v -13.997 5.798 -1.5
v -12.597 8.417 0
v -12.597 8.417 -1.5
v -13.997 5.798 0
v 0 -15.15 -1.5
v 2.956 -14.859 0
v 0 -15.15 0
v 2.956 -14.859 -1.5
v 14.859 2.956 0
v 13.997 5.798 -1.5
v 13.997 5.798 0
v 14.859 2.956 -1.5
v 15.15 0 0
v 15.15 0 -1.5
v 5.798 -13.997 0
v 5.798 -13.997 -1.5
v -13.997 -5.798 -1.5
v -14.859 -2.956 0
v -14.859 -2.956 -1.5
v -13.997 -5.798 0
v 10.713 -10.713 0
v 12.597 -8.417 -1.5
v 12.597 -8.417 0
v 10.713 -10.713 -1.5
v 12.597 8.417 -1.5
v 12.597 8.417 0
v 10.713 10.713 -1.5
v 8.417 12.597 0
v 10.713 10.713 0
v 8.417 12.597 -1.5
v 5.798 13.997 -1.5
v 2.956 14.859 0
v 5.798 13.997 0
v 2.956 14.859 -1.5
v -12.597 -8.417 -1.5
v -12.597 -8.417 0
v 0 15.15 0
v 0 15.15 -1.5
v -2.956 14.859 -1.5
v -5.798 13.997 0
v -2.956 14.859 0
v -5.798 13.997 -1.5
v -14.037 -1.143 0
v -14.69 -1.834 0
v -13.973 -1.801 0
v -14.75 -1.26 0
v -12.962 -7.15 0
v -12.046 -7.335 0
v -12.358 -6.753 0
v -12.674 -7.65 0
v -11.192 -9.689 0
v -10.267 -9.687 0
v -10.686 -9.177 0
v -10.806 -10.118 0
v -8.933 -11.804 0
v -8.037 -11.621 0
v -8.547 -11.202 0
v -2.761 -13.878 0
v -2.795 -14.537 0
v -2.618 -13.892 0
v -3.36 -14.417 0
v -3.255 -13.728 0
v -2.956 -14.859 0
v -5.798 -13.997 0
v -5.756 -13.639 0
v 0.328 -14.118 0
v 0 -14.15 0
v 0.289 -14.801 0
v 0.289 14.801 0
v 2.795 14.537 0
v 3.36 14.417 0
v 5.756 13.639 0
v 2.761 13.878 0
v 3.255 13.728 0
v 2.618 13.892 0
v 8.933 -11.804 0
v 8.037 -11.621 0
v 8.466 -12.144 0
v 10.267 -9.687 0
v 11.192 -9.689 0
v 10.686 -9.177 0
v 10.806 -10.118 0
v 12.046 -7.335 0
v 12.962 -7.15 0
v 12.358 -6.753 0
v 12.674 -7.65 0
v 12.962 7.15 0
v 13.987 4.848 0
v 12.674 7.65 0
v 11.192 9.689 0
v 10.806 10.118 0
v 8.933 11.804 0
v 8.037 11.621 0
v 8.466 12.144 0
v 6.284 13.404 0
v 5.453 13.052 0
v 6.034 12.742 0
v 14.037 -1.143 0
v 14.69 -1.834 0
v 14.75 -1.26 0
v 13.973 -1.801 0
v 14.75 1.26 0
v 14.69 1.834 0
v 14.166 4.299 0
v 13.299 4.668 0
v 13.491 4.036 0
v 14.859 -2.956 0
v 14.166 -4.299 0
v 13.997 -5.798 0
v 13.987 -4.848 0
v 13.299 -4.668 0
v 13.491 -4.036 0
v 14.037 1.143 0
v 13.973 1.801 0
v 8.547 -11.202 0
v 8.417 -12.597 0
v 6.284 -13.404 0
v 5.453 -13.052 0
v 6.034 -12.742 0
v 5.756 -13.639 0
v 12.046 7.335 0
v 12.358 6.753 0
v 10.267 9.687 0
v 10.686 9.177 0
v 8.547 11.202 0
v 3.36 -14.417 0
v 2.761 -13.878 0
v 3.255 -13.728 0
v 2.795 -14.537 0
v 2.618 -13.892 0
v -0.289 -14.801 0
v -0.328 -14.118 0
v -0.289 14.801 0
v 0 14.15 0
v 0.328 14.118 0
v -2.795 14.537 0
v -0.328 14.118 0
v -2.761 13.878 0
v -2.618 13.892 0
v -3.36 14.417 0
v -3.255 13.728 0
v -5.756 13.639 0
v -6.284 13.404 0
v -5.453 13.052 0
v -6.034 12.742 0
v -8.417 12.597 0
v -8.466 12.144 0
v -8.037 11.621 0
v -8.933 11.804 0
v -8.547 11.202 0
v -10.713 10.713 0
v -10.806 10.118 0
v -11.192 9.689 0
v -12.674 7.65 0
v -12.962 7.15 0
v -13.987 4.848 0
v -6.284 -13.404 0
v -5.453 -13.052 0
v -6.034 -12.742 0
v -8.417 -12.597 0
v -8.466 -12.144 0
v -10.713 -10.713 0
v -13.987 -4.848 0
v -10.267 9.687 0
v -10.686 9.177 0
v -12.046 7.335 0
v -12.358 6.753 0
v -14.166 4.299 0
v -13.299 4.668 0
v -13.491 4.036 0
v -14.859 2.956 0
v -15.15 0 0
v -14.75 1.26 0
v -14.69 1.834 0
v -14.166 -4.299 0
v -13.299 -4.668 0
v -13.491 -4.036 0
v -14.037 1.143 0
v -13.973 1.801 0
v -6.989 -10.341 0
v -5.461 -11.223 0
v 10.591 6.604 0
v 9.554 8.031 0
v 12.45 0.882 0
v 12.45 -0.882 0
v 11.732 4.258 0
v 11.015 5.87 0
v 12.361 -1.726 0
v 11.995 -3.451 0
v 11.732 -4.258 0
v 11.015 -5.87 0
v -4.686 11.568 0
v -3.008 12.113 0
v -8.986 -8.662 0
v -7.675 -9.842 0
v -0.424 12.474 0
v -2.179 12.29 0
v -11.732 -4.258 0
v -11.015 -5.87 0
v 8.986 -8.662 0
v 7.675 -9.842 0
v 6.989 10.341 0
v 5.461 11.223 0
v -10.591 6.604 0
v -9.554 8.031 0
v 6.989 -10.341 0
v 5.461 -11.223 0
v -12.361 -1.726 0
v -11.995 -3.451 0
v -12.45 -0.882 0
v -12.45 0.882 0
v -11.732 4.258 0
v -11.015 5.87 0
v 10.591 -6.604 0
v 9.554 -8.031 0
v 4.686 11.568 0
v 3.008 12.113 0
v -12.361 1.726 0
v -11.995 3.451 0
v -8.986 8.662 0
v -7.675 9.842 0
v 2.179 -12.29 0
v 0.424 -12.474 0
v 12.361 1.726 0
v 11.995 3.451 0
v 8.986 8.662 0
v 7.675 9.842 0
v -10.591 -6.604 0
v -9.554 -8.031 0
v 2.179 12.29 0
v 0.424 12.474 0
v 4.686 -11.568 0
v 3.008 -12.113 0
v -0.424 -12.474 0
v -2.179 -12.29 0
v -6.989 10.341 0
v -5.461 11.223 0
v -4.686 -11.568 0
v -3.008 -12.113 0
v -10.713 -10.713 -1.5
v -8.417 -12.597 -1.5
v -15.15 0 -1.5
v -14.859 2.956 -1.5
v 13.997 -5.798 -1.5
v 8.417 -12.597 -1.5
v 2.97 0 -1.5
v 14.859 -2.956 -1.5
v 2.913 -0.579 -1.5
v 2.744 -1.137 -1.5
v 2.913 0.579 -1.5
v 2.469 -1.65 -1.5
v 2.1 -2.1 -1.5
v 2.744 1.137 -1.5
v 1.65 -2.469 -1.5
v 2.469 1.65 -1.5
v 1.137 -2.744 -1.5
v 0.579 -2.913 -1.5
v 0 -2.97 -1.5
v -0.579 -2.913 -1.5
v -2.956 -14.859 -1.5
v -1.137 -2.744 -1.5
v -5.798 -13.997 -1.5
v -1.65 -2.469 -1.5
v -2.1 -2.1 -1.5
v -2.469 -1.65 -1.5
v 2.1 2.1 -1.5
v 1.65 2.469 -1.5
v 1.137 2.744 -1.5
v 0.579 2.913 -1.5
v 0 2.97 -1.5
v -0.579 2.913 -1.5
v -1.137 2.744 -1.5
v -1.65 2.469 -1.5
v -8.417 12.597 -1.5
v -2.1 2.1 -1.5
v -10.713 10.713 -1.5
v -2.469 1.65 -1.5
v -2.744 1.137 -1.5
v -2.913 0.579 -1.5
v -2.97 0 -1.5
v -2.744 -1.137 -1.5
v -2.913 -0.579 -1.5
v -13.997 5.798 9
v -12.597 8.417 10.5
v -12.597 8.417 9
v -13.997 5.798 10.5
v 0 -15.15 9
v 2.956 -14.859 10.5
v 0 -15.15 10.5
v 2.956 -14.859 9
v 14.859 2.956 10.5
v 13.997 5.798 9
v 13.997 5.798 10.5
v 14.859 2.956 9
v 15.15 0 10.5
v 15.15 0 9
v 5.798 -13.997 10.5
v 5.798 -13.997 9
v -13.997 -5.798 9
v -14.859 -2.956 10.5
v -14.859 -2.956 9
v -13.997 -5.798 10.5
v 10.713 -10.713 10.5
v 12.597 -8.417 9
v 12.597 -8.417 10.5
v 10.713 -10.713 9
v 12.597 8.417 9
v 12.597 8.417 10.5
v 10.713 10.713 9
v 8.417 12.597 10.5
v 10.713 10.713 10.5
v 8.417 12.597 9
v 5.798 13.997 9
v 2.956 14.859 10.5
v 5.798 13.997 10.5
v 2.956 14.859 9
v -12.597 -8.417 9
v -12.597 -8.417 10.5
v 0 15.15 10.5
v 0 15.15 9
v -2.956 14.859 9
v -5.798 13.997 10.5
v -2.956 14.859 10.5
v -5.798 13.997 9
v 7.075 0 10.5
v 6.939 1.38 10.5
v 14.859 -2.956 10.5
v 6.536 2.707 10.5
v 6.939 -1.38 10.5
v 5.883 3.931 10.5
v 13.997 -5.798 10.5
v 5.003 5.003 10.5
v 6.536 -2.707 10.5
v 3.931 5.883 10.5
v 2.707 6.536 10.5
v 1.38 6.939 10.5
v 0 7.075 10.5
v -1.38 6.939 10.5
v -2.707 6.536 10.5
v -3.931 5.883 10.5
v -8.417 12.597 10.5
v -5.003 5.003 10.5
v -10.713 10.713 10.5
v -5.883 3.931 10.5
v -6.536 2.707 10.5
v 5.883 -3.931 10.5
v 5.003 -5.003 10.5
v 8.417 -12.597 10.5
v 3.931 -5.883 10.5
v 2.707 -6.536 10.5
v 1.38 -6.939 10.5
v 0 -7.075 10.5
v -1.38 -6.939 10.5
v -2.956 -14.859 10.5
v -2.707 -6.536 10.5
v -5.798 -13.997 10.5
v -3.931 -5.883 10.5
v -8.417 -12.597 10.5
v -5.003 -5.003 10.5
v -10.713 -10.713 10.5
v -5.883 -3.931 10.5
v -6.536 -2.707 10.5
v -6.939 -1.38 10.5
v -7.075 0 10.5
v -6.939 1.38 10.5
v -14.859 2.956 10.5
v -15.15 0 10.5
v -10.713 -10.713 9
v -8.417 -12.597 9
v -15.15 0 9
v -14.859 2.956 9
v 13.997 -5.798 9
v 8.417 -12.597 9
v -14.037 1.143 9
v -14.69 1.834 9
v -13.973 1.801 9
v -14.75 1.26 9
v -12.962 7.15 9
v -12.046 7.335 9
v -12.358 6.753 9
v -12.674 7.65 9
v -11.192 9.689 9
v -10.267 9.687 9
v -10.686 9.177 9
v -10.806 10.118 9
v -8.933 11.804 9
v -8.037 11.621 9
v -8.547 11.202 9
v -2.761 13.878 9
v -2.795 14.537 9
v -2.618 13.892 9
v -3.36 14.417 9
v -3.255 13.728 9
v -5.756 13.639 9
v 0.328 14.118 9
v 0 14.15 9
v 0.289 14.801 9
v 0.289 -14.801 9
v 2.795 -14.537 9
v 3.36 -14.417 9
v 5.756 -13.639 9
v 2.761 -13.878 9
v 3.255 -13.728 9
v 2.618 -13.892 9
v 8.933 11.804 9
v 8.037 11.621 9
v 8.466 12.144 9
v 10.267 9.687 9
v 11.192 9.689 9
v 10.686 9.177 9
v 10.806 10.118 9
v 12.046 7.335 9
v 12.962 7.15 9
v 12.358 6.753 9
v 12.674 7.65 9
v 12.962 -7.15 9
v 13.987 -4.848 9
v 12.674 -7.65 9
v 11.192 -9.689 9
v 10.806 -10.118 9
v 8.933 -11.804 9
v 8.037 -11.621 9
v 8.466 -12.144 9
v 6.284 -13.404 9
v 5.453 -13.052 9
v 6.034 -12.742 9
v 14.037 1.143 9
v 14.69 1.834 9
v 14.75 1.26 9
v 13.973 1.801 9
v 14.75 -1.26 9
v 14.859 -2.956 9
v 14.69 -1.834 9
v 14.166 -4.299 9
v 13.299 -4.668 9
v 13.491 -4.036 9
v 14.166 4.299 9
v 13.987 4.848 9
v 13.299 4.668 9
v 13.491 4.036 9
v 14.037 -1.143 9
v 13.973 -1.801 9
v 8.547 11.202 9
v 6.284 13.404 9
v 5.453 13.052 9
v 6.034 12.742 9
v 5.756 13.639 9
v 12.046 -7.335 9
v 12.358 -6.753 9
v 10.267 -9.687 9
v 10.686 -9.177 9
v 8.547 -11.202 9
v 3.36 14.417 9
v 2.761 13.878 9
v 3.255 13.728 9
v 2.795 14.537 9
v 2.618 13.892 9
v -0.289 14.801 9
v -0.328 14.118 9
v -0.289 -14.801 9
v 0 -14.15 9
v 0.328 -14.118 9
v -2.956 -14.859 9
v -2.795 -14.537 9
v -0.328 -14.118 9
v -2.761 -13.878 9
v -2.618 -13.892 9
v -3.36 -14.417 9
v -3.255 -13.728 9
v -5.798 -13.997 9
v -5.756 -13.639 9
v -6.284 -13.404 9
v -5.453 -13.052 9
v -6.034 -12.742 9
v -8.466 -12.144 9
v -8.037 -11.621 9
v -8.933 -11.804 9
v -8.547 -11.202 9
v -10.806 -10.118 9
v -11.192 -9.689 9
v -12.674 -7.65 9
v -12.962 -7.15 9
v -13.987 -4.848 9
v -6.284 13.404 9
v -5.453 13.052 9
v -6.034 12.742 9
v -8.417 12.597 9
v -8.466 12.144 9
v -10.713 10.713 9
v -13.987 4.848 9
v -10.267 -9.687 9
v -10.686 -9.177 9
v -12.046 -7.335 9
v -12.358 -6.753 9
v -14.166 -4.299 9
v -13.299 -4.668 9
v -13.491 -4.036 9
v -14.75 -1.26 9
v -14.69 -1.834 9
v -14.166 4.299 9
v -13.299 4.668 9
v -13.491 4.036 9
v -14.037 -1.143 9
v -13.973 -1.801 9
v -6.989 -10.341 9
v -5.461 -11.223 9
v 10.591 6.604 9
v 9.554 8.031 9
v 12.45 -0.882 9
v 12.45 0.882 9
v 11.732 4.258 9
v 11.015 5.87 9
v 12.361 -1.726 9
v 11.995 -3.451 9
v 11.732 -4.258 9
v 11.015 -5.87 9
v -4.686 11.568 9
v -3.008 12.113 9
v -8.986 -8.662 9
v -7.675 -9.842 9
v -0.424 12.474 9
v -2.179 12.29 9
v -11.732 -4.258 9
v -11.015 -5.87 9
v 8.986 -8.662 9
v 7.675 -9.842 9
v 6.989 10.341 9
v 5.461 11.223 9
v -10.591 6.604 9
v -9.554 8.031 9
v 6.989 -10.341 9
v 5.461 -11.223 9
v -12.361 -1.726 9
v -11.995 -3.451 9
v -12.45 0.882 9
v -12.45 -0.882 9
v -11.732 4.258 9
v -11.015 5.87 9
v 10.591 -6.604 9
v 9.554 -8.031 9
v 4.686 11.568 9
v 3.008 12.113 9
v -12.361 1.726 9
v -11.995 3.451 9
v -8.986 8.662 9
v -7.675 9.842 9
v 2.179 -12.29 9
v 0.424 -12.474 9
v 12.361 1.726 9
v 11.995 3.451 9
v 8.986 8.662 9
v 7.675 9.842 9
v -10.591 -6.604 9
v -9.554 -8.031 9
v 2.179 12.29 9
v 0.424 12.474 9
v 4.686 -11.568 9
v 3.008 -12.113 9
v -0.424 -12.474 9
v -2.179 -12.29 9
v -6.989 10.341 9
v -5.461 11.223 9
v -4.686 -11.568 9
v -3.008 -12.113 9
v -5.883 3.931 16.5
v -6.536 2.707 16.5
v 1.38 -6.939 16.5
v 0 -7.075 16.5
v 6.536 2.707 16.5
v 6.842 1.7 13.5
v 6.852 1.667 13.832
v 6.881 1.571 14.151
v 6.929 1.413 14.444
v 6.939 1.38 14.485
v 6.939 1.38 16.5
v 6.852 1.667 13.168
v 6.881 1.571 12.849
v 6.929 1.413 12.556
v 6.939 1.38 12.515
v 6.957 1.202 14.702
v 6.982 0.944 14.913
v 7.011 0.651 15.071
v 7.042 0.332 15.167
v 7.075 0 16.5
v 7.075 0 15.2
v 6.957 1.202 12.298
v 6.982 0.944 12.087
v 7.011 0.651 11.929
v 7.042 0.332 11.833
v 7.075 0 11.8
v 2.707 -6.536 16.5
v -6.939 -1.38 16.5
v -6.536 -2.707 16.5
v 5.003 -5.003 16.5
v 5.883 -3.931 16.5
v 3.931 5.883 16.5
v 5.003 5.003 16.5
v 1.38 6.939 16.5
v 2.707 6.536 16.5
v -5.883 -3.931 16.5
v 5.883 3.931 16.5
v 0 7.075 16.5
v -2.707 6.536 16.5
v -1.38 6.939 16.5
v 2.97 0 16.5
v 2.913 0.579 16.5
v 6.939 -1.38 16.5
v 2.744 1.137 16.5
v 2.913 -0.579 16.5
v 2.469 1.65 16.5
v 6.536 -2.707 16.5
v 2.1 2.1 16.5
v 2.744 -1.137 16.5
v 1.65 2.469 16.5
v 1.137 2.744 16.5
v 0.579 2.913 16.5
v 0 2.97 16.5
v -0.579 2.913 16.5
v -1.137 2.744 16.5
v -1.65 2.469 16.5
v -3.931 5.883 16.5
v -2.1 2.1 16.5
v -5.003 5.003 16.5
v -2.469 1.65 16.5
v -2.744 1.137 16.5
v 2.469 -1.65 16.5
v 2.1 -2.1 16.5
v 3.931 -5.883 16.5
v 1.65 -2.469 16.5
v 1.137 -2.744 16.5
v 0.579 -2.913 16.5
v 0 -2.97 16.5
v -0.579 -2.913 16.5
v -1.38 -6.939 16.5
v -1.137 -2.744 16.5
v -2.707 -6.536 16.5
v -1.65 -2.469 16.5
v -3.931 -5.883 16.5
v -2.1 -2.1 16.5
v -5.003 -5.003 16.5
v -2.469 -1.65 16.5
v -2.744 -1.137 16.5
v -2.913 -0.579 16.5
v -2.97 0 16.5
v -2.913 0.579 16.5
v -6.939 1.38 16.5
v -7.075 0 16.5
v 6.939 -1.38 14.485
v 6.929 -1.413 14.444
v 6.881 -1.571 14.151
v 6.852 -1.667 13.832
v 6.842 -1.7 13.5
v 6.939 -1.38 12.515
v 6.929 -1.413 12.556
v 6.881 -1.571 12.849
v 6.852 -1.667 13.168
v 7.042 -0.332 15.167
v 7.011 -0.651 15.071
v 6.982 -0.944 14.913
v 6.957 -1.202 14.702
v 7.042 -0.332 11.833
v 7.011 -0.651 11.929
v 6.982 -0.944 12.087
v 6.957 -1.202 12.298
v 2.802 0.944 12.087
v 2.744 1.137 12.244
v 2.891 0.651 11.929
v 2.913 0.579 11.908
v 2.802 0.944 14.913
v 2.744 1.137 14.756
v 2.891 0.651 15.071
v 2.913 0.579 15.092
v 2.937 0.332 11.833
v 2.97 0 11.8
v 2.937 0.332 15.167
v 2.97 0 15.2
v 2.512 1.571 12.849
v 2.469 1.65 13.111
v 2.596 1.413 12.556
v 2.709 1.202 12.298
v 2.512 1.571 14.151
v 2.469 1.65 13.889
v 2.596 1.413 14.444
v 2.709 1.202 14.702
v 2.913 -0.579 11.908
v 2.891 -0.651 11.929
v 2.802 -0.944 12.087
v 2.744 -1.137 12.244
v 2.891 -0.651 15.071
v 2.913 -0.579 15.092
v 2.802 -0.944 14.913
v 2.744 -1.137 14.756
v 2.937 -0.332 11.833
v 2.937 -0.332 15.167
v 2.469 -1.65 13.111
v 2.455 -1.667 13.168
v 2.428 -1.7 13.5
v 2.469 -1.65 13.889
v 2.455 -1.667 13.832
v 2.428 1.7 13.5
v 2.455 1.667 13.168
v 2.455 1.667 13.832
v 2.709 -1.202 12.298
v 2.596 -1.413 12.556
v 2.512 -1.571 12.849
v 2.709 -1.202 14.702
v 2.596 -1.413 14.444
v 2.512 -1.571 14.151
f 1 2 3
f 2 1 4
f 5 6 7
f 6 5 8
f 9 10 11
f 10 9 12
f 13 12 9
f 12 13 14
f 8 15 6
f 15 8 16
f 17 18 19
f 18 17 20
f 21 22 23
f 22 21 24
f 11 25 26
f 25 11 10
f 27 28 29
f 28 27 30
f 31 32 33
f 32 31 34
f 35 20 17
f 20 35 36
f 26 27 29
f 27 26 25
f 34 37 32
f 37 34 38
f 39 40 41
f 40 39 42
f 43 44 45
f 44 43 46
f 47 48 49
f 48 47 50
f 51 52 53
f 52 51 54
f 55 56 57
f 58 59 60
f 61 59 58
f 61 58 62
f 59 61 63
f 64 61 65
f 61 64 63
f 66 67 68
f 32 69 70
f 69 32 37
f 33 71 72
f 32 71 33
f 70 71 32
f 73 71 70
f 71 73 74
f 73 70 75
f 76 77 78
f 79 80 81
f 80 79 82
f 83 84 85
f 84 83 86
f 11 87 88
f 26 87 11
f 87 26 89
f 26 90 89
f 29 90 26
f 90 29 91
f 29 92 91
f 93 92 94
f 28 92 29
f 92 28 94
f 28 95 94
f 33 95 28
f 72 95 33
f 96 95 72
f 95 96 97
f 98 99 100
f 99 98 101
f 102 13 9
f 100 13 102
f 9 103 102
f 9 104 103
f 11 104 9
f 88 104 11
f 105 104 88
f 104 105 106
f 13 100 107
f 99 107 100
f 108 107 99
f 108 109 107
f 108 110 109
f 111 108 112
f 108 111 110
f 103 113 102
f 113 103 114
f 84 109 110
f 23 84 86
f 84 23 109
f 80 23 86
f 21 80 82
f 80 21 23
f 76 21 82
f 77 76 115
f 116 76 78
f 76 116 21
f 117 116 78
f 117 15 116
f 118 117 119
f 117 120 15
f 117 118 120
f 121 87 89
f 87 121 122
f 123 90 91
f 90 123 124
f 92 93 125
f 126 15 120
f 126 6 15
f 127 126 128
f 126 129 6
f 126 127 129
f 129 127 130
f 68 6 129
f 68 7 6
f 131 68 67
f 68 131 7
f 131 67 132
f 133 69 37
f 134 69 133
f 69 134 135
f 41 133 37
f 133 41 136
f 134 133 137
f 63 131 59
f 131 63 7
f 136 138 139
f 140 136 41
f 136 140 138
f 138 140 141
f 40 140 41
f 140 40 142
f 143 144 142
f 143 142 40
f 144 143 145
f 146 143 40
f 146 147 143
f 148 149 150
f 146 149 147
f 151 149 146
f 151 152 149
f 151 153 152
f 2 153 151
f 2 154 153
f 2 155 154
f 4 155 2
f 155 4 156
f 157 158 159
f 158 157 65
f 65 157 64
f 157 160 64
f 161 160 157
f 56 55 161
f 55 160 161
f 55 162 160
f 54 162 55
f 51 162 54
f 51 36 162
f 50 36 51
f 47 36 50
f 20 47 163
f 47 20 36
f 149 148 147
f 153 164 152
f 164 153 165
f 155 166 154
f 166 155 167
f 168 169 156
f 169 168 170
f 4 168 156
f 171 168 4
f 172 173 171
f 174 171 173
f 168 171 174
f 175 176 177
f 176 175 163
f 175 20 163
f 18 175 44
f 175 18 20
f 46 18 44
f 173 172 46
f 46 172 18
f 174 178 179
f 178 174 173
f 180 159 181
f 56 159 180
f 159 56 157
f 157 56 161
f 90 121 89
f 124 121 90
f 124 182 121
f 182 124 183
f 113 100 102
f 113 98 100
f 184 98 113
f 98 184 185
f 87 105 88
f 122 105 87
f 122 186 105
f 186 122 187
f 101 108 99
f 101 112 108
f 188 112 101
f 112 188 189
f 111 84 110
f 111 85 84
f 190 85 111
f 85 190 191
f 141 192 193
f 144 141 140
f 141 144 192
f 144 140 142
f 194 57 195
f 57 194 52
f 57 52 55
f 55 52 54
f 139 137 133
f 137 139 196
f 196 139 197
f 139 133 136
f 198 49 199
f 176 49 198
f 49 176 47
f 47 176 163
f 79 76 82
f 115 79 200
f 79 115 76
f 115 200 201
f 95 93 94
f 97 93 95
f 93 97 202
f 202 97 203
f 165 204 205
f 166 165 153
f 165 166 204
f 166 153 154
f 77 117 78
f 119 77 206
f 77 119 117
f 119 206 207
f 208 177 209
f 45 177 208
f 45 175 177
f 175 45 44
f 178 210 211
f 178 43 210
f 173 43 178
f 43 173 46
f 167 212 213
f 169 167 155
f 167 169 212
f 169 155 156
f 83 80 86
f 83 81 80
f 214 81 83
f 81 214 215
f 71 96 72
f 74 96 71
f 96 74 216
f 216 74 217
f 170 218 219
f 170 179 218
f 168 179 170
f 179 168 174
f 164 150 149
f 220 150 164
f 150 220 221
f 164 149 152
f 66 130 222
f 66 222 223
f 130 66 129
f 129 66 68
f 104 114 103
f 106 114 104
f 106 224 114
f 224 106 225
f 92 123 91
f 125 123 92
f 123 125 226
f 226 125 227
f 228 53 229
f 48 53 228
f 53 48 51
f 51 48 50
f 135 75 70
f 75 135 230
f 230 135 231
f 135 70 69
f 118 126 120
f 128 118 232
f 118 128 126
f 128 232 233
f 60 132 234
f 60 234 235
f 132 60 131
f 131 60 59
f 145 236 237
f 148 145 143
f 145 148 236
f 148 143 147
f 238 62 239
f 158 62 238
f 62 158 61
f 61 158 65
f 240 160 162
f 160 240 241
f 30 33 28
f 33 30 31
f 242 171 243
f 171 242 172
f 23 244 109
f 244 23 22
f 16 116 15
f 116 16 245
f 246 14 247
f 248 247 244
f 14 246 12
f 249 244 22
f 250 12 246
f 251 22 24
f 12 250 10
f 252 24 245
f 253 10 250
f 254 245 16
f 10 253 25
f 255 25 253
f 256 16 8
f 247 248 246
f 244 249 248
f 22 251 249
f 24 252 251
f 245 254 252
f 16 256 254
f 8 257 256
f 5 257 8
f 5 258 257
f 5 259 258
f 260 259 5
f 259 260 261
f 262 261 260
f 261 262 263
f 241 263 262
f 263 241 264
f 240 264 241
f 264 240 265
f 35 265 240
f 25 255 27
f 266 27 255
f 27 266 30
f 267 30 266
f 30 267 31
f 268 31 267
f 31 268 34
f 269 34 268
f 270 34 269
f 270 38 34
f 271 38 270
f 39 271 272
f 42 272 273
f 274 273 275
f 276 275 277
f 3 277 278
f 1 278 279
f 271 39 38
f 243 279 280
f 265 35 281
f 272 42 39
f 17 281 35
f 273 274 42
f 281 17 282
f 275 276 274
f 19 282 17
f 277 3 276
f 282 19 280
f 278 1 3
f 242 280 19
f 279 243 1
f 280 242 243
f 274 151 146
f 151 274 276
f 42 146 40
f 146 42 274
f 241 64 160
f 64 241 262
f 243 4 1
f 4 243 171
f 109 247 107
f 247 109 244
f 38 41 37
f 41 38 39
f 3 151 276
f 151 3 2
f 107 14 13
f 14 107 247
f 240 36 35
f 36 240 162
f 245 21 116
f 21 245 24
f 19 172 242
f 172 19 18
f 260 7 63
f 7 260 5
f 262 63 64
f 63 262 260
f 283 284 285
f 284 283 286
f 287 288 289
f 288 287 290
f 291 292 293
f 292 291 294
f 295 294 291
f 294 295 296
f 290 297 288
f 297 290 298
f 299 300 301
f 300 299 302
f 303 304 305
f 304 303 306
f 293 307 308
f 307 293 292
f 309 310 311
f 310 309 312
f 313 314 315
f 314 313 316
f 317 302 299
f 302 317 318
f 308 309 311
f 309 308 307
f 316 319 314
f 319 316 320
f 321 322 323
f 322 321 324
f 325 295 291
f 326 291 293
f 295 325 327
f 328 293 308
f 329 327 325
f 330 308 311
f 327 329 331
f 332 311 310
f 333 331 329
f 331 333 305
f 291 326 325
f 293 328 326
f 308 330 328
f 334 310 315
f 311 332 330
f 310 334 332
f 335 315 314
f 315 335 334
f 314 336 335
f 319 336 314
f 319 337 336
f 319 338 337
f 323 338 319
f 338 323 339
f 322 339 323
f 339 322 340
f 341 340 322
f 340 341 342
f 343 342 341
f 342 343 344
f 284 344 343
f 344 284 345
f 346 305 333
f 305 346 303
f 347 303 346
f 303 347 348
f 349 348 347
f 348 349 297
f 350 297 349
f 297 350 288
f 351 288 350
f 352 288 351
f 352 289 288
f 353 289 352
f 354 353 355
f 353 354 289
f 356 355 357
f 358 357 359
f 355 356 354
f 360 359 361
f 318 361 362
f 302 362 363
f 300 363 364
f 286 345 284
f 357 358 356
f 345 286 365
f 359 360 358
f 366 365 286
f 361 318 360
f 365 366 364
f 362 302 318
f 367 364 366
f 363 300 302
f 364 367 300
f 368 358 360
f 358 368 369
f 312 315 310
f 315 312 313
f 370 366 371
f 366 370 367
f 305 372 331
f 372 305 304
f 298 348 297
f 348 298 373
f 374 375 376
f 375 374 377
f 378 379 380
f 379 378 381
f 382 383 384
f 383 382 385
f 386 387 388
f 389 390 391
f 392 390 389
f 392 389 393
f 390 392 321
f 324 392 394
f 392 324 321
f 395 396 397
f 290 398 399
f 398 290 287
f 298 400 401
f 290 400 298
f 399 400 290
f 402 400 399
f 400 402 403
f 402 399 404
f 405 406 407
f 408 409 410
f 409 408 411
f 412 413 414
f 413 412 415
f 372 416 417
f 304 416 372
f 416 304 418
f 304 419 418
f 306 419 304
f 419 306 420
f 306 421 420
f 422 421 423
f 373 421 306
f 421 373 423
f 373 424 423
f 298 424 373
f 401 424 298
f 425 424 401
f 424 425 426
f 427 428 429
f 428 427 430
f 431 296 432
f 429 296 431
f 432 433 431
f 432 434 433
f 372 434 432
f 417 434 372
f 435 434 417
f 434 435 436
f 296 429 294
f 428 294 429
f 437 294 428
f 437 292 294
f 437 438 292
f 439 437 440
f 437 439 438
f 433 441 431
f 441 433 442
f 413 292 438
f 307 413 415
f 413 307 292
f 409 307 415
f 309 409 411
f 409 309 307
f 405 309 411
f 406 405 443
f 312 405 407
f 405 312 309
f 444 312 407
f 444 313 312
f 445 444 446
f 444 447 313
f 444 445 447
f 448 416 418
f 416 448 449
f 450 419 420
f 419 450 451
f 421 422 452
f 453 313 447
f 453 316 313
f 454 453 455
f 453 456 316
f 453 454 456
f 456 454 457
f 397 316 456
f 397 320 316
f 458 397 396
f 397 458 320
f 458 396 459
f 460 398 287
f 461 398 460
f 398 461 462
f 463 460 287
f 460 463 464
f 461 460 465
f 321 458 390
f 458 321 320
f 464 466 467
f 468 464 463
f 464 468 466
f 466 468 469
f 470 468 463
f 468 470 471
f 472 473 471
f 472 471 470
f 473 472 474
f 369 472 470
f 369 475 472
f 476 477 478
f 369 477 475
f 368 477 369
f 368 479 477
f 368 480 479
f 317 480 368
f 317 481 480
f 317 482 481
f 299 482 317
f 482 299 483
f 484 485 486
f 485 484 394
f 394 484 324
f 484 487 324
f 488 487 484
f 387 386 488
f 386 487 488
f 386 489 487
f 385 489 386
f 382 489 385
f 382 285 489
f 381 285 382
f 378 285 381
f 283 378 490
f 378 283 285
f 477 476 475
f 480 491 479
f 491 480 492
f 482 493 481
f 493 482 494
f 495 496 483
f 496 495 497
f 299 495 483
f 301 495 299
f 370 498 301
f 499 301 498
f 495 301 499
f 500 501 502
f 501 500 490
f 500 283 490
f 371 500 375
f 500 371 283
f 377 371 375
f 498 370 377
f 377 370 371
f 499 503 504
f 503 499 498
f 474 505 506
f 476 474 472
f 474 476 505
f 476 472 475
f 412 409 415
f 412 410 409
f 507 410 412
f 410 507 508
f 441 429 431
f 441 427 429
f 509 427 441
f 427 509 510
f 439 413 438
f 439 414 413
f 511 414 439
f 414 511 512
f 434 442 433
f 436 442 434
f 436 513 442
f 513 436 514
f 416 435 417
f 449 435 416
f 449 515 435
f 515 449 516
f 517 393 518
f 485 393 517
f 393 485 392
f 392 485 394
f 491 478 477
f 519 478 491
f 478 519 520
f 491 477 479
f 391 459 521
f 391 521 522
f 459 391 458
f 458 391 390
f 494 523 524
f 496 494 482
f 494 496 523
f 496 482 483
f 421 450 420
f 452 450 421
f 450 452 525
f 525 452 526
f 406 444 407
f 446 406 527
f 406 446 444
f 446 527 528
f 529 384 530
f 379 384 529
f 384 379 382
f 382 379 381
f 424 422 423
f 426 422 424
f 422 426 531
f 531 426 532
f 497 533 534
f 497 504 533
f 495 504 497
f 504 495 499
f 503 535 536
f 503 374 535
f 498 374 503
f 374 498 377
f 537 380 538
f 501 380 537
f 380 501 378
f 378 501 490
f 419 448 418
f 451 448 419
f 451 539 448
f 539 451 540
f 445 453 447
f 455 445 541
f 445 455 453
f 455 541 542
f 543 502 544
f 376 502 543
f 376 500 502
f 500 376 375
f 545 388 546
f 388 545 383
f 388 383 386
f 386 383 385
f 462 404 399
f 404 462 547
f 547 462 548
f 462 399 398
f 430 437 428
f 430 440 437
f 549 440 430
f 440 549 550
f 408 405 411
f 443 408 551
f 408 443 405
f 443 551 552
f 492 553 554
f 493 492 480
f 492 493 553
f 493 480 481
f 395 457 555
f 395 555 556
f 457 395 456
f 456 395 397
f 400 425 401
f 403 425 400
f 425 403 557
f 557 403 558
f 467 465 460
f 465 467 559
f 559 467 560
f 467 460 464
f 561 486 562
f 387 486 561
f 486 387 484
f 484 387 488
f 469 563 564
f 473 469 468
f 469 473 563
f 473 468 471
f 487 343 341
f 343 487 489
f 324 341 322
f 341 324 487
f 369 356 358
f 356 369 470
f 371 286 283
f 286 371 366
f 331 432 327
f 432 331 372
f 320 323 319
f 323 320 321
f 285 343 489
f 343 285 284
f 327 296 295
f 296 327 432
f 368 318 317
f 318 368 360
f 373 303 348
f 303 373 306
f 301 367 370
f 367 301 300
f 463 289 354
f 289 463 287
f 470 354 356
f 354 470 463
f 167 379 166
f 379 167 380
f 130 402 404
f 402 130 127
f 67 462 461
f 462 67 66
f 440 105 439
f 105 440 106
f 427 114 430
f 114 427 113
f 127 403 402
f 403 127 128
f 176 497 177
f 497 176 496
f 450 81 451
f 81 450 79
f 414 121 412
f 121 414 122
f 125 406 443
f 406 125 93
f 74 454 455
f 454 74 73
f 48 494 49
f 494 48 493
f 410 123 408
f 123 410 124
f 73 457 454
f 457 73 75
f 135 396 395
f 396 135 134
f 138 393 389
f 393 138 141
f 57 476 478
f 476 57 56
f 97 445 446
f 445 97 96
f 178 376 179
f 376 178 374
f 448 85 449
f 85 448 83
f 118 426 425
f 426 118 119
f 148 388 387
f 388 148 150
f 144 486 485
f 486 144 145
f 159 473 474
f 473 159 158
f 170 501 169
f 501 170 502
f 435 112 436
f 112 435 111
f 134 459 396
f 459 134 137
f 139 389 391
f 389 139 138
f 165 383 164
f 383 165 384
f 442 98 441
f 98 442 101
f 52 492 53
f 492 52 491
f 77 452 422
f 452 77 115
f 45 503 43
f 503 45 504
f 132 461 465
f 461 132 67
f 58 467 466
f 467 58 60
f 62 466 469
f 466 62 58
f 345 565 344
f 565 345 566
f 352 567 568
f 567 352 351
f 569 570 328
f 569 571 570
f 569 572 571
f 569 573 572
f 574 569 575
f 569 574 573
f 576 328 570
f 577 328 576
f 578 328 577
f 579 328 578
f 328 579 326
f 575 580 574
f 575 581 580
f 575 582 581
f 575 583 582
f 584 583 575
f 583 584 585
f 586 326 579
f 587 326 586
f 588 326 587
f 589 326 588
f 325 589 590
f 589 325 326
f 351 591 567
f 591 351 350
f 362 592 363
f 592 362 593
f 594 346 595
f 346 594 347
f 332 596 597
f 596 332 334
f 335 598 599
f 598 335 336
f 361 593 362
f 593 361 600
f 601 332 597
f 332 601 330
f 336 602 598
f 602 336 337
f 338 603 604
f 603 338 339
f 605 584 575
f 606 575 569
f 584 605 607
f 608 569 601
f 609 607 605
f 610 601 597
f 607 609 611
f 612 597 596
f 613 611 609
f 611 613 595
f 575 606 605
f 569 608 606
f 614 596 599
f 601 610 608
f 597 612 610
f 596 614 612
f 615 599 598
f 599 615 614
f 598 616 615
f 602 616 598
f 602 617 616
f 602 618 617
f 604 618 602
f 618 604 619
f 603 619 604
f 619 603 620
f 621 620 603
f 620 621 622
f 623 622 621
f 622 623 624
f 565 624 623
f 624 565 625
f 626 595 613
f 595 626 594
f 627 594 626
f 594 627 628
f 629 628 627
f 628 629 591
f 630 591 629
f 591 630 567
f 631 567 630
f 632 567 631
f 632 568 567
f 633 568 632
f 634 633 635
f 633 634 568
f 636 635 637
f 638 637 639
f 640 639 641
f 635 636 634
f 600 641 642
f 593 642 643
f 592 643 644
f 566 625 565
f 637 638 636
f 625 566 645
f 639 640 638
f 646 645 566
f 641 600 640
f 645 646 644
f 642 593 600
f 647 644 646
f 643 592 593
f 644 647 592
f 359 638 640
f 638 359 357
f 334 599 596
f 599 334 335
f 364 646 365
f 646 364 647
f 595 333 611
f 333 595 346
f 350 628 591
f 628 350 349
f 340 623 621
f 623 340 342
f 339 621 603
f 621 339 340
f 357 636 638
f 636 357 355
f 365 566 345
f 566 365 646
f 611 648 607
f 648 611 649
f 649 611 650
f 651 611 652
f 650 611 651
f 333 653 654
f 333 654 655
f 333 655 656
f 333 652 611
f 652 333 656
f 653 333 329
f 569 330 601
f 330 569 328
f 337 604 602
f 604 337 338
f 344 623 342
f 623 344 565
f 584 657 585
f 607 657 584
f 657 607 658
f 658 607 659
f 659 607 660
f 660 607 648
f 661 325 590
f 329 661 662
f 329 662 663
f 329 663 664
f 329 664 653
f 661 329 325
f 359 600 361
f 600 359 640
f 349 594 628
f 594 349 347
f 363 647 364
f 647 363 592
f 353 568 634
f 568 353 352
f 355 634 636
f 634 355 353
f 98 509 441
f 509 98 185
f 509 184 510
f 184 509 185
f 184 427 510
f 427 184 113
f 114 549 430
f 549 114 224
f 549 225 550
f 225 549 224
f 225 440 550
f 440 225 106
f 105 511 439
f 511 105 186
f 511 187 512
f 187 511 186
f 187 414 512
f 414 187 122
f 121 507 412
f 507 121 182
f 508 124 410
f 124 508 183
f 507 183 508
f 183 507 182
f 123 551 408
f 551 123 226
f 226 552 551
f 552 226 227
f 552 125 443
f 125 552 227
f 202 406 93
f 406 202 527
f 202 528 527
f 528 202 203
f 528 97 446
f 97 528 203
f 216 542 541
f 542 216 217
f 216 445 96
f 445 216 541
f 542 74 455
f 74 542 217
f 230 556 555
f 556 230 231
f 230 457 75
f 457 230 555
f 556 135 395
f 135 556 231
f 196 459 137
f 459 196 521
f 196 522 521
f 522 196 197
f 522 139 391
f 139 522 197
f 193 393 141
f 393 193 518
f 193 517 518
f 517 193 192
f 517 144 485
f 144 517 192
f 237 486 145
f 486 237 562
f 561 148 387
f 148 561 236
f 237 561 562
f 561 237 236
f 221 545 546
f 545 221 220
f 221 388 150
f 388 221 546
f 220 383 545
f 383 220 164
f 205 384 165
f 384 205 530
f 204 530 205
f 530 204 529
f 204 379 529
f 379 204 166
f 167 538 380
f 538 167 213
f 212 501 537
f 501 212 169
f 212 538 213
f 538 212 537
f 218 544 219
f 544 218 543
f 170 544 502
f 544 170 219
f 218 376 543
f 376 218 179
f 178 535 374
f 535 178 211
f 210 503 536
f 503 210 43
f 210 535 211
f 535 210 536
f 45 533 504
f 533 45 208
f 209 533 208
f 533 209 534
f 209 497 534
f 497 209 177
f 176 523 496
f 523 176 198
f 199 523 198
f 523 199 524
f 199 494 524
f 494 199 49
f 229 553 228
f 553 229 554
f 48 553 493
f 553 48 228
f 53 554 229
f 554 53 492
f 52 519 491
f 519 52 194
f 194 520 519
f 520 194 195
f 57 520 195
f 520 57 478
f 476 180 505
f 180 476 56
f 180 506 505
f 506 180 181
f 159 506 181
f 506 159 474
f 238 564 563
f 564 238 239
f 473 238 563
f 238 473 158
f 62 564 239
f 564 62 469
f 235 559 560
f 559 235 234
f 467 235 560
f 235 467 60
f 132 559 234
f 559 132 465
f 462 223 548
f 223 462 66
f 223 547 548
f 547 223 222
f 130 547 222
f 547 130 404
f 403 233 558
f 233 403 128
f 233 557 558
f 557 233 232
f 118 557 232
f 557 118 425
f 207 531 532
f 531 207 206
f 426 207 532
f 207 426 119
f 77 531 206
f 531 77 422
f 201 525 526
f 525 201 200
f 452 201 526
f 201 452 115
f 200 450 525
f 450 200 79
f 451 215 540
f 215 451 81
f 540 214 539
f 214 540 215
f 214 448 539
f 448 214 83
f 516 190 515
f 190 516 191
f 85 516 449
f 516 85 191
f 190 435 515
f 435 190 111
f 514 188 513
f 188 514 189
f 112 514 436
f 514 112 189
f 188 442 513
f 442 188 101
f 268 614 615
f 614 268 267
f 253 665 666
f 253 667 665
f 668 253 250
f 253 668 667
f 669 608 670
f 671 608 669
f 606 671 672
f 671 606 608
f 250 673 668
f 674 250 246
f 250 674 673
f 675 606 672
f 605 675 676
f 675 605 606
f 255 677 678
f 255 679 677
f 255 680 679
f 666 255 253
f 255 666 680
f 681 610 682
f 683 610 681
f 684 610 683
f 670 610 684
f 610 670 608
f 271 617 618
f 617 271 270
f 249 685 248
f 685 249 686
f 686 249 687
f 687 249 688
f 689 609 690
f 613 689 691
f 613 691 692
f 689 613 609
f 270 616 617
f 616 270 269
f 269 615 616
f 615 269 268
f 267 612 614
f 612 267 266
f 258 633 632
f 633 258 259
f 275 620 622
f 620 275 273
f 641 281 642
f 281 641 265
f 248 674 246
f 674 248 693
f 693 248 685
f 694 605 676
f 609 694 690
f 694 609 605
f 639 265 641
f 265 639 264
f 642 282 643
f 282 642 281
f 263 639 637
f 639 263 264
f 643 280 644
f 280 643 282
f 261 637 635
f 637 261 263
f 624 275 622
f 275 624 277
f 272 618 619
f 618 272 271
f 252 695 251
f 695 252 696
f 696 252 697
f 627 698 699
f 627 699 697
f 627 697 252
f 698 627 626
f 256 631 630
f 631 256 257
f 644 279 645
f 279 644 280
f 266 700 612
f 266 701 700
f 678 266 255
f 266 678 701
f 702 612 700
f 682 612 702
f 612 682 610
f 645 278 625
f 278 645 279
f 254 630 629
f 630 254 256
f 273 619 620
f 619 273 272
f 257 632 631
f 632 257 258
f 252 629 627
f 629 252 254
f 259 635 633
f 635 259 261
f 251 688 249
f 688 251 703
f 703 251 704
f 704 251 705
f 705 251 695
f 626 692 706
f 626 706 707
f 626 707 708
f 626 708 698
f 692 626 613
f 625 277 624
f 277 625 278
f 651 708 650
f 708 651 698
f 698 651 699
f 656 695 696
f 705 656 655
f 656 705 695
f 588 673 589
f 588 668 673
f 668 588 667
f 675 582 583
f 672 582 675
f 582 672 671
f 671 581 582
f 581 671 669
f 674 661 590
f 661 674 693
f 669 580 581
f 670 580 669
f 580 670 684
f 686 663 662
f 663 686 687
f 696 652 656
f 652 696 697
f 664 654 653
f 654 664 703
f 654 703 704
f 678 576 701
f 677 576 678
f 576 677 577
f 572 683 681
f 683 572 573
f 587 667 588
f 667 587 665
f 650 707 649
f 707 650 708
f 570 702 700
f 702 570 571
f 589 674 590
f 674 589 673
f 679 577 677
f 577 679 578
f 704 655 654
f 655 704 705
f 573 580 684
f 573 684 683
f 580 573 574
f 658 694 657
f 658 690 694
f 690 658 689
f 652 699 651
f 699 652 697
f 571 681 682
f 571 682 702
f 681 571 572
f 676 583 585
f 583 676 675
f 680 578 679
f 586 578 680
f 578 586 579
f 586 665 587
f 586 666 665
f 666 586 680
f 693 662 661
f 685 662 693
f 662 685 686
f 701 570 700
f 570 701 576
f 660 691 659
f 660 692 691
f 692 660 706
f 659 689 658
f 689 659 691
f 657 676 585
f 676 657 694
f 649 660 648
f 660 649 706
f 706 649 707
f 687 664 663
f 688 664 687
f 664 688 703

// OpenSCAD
$fn = 32;

// ----------------------------------------------------------------------
// Timing pulley: GT3 30T, pitch 3 mm, 30.3 mm x 18 mm
// ----------------------------------------------------------------------

// --- parameters (mm) ---
pitch_mm = 3;             // belt pitch
tooth_count = 30;         // number of grooves
width = 9;                // belt width between the flanges
tip_d = 28.3;             // tip circle diameter
root_d = 26.1;            // groove bottom diameter
groove_h = 1.1;           // groove depth
tooth_w = 2.1;            // groove width at the tip circle
side_d = 30.3;            // flange diameter
side_t = 1.5;             // flange thickness
spigot_d = 24.5;          // flange spigot, sunk into the rim
spigot_h = 1.2;           // spigot depth into the rim
hub_bore = 5.94;          // shaft bore
hub_d = 14.15;            // hub diameter
hub_h = 6;                // hub above the flange
bottom_z = -1.5;          // lowest point of the pulley
top_z = 16.5;             // highest point of the pulley
set_d = 3.4;              // set screw tap hole

module rim() {
  cylinder(h = width, d = tip_d);
}

module groove_cutter() {
  /* belt tooth groove: deeper than wide, cut through the belt width */
  translate([root_d / 2, 0, 0])
    linear_extrude(height = width)
      polygon(points = [[-0.6, -tooth_w * 0.42], [groove_h + 0.6, -tooth_w * 0.6],
                        [groove_h + 0.6, tooth_w * 0.6], [-0.6, tooth_w * 0.42]]);
}

module flanges() {
  translate([0, 0, -side_t]) cylinder(h = side_t, d = side_d);
  translate([0, 0, width]) cylinder(h = side_t, d = side_d);
  translate([0, 0, -spigot_h]) cylinder(h = spigot_h + 0.6, d = spigot_d);
  translate([0, 0, width - 0.6]) cylinder(h = spigot_h + 0.6, d = spigot_d);
}

module hub() {
  translate([0, 0, bottom_z]) cylinder(h = top_z - bottom_z, d = hub_d);
}

difference() {
  union() {
    rim();
    hub();
    flanges();
  }
  for (i = [0 : tooth_count - 1]) rotate([0, 0, i * 360 / tooth_count]) groove_cutter();
  translate([0, 0, bottom_z - 1]) cylinder(h = top_z - bottom_z + 2, d = hub_bore);
  translate([-1, 0, top_z - hub_h * 0.5]) rotate([0, 90, 0]) cylinder(h = hub_d / 2 + 3, d = set_d);
}
